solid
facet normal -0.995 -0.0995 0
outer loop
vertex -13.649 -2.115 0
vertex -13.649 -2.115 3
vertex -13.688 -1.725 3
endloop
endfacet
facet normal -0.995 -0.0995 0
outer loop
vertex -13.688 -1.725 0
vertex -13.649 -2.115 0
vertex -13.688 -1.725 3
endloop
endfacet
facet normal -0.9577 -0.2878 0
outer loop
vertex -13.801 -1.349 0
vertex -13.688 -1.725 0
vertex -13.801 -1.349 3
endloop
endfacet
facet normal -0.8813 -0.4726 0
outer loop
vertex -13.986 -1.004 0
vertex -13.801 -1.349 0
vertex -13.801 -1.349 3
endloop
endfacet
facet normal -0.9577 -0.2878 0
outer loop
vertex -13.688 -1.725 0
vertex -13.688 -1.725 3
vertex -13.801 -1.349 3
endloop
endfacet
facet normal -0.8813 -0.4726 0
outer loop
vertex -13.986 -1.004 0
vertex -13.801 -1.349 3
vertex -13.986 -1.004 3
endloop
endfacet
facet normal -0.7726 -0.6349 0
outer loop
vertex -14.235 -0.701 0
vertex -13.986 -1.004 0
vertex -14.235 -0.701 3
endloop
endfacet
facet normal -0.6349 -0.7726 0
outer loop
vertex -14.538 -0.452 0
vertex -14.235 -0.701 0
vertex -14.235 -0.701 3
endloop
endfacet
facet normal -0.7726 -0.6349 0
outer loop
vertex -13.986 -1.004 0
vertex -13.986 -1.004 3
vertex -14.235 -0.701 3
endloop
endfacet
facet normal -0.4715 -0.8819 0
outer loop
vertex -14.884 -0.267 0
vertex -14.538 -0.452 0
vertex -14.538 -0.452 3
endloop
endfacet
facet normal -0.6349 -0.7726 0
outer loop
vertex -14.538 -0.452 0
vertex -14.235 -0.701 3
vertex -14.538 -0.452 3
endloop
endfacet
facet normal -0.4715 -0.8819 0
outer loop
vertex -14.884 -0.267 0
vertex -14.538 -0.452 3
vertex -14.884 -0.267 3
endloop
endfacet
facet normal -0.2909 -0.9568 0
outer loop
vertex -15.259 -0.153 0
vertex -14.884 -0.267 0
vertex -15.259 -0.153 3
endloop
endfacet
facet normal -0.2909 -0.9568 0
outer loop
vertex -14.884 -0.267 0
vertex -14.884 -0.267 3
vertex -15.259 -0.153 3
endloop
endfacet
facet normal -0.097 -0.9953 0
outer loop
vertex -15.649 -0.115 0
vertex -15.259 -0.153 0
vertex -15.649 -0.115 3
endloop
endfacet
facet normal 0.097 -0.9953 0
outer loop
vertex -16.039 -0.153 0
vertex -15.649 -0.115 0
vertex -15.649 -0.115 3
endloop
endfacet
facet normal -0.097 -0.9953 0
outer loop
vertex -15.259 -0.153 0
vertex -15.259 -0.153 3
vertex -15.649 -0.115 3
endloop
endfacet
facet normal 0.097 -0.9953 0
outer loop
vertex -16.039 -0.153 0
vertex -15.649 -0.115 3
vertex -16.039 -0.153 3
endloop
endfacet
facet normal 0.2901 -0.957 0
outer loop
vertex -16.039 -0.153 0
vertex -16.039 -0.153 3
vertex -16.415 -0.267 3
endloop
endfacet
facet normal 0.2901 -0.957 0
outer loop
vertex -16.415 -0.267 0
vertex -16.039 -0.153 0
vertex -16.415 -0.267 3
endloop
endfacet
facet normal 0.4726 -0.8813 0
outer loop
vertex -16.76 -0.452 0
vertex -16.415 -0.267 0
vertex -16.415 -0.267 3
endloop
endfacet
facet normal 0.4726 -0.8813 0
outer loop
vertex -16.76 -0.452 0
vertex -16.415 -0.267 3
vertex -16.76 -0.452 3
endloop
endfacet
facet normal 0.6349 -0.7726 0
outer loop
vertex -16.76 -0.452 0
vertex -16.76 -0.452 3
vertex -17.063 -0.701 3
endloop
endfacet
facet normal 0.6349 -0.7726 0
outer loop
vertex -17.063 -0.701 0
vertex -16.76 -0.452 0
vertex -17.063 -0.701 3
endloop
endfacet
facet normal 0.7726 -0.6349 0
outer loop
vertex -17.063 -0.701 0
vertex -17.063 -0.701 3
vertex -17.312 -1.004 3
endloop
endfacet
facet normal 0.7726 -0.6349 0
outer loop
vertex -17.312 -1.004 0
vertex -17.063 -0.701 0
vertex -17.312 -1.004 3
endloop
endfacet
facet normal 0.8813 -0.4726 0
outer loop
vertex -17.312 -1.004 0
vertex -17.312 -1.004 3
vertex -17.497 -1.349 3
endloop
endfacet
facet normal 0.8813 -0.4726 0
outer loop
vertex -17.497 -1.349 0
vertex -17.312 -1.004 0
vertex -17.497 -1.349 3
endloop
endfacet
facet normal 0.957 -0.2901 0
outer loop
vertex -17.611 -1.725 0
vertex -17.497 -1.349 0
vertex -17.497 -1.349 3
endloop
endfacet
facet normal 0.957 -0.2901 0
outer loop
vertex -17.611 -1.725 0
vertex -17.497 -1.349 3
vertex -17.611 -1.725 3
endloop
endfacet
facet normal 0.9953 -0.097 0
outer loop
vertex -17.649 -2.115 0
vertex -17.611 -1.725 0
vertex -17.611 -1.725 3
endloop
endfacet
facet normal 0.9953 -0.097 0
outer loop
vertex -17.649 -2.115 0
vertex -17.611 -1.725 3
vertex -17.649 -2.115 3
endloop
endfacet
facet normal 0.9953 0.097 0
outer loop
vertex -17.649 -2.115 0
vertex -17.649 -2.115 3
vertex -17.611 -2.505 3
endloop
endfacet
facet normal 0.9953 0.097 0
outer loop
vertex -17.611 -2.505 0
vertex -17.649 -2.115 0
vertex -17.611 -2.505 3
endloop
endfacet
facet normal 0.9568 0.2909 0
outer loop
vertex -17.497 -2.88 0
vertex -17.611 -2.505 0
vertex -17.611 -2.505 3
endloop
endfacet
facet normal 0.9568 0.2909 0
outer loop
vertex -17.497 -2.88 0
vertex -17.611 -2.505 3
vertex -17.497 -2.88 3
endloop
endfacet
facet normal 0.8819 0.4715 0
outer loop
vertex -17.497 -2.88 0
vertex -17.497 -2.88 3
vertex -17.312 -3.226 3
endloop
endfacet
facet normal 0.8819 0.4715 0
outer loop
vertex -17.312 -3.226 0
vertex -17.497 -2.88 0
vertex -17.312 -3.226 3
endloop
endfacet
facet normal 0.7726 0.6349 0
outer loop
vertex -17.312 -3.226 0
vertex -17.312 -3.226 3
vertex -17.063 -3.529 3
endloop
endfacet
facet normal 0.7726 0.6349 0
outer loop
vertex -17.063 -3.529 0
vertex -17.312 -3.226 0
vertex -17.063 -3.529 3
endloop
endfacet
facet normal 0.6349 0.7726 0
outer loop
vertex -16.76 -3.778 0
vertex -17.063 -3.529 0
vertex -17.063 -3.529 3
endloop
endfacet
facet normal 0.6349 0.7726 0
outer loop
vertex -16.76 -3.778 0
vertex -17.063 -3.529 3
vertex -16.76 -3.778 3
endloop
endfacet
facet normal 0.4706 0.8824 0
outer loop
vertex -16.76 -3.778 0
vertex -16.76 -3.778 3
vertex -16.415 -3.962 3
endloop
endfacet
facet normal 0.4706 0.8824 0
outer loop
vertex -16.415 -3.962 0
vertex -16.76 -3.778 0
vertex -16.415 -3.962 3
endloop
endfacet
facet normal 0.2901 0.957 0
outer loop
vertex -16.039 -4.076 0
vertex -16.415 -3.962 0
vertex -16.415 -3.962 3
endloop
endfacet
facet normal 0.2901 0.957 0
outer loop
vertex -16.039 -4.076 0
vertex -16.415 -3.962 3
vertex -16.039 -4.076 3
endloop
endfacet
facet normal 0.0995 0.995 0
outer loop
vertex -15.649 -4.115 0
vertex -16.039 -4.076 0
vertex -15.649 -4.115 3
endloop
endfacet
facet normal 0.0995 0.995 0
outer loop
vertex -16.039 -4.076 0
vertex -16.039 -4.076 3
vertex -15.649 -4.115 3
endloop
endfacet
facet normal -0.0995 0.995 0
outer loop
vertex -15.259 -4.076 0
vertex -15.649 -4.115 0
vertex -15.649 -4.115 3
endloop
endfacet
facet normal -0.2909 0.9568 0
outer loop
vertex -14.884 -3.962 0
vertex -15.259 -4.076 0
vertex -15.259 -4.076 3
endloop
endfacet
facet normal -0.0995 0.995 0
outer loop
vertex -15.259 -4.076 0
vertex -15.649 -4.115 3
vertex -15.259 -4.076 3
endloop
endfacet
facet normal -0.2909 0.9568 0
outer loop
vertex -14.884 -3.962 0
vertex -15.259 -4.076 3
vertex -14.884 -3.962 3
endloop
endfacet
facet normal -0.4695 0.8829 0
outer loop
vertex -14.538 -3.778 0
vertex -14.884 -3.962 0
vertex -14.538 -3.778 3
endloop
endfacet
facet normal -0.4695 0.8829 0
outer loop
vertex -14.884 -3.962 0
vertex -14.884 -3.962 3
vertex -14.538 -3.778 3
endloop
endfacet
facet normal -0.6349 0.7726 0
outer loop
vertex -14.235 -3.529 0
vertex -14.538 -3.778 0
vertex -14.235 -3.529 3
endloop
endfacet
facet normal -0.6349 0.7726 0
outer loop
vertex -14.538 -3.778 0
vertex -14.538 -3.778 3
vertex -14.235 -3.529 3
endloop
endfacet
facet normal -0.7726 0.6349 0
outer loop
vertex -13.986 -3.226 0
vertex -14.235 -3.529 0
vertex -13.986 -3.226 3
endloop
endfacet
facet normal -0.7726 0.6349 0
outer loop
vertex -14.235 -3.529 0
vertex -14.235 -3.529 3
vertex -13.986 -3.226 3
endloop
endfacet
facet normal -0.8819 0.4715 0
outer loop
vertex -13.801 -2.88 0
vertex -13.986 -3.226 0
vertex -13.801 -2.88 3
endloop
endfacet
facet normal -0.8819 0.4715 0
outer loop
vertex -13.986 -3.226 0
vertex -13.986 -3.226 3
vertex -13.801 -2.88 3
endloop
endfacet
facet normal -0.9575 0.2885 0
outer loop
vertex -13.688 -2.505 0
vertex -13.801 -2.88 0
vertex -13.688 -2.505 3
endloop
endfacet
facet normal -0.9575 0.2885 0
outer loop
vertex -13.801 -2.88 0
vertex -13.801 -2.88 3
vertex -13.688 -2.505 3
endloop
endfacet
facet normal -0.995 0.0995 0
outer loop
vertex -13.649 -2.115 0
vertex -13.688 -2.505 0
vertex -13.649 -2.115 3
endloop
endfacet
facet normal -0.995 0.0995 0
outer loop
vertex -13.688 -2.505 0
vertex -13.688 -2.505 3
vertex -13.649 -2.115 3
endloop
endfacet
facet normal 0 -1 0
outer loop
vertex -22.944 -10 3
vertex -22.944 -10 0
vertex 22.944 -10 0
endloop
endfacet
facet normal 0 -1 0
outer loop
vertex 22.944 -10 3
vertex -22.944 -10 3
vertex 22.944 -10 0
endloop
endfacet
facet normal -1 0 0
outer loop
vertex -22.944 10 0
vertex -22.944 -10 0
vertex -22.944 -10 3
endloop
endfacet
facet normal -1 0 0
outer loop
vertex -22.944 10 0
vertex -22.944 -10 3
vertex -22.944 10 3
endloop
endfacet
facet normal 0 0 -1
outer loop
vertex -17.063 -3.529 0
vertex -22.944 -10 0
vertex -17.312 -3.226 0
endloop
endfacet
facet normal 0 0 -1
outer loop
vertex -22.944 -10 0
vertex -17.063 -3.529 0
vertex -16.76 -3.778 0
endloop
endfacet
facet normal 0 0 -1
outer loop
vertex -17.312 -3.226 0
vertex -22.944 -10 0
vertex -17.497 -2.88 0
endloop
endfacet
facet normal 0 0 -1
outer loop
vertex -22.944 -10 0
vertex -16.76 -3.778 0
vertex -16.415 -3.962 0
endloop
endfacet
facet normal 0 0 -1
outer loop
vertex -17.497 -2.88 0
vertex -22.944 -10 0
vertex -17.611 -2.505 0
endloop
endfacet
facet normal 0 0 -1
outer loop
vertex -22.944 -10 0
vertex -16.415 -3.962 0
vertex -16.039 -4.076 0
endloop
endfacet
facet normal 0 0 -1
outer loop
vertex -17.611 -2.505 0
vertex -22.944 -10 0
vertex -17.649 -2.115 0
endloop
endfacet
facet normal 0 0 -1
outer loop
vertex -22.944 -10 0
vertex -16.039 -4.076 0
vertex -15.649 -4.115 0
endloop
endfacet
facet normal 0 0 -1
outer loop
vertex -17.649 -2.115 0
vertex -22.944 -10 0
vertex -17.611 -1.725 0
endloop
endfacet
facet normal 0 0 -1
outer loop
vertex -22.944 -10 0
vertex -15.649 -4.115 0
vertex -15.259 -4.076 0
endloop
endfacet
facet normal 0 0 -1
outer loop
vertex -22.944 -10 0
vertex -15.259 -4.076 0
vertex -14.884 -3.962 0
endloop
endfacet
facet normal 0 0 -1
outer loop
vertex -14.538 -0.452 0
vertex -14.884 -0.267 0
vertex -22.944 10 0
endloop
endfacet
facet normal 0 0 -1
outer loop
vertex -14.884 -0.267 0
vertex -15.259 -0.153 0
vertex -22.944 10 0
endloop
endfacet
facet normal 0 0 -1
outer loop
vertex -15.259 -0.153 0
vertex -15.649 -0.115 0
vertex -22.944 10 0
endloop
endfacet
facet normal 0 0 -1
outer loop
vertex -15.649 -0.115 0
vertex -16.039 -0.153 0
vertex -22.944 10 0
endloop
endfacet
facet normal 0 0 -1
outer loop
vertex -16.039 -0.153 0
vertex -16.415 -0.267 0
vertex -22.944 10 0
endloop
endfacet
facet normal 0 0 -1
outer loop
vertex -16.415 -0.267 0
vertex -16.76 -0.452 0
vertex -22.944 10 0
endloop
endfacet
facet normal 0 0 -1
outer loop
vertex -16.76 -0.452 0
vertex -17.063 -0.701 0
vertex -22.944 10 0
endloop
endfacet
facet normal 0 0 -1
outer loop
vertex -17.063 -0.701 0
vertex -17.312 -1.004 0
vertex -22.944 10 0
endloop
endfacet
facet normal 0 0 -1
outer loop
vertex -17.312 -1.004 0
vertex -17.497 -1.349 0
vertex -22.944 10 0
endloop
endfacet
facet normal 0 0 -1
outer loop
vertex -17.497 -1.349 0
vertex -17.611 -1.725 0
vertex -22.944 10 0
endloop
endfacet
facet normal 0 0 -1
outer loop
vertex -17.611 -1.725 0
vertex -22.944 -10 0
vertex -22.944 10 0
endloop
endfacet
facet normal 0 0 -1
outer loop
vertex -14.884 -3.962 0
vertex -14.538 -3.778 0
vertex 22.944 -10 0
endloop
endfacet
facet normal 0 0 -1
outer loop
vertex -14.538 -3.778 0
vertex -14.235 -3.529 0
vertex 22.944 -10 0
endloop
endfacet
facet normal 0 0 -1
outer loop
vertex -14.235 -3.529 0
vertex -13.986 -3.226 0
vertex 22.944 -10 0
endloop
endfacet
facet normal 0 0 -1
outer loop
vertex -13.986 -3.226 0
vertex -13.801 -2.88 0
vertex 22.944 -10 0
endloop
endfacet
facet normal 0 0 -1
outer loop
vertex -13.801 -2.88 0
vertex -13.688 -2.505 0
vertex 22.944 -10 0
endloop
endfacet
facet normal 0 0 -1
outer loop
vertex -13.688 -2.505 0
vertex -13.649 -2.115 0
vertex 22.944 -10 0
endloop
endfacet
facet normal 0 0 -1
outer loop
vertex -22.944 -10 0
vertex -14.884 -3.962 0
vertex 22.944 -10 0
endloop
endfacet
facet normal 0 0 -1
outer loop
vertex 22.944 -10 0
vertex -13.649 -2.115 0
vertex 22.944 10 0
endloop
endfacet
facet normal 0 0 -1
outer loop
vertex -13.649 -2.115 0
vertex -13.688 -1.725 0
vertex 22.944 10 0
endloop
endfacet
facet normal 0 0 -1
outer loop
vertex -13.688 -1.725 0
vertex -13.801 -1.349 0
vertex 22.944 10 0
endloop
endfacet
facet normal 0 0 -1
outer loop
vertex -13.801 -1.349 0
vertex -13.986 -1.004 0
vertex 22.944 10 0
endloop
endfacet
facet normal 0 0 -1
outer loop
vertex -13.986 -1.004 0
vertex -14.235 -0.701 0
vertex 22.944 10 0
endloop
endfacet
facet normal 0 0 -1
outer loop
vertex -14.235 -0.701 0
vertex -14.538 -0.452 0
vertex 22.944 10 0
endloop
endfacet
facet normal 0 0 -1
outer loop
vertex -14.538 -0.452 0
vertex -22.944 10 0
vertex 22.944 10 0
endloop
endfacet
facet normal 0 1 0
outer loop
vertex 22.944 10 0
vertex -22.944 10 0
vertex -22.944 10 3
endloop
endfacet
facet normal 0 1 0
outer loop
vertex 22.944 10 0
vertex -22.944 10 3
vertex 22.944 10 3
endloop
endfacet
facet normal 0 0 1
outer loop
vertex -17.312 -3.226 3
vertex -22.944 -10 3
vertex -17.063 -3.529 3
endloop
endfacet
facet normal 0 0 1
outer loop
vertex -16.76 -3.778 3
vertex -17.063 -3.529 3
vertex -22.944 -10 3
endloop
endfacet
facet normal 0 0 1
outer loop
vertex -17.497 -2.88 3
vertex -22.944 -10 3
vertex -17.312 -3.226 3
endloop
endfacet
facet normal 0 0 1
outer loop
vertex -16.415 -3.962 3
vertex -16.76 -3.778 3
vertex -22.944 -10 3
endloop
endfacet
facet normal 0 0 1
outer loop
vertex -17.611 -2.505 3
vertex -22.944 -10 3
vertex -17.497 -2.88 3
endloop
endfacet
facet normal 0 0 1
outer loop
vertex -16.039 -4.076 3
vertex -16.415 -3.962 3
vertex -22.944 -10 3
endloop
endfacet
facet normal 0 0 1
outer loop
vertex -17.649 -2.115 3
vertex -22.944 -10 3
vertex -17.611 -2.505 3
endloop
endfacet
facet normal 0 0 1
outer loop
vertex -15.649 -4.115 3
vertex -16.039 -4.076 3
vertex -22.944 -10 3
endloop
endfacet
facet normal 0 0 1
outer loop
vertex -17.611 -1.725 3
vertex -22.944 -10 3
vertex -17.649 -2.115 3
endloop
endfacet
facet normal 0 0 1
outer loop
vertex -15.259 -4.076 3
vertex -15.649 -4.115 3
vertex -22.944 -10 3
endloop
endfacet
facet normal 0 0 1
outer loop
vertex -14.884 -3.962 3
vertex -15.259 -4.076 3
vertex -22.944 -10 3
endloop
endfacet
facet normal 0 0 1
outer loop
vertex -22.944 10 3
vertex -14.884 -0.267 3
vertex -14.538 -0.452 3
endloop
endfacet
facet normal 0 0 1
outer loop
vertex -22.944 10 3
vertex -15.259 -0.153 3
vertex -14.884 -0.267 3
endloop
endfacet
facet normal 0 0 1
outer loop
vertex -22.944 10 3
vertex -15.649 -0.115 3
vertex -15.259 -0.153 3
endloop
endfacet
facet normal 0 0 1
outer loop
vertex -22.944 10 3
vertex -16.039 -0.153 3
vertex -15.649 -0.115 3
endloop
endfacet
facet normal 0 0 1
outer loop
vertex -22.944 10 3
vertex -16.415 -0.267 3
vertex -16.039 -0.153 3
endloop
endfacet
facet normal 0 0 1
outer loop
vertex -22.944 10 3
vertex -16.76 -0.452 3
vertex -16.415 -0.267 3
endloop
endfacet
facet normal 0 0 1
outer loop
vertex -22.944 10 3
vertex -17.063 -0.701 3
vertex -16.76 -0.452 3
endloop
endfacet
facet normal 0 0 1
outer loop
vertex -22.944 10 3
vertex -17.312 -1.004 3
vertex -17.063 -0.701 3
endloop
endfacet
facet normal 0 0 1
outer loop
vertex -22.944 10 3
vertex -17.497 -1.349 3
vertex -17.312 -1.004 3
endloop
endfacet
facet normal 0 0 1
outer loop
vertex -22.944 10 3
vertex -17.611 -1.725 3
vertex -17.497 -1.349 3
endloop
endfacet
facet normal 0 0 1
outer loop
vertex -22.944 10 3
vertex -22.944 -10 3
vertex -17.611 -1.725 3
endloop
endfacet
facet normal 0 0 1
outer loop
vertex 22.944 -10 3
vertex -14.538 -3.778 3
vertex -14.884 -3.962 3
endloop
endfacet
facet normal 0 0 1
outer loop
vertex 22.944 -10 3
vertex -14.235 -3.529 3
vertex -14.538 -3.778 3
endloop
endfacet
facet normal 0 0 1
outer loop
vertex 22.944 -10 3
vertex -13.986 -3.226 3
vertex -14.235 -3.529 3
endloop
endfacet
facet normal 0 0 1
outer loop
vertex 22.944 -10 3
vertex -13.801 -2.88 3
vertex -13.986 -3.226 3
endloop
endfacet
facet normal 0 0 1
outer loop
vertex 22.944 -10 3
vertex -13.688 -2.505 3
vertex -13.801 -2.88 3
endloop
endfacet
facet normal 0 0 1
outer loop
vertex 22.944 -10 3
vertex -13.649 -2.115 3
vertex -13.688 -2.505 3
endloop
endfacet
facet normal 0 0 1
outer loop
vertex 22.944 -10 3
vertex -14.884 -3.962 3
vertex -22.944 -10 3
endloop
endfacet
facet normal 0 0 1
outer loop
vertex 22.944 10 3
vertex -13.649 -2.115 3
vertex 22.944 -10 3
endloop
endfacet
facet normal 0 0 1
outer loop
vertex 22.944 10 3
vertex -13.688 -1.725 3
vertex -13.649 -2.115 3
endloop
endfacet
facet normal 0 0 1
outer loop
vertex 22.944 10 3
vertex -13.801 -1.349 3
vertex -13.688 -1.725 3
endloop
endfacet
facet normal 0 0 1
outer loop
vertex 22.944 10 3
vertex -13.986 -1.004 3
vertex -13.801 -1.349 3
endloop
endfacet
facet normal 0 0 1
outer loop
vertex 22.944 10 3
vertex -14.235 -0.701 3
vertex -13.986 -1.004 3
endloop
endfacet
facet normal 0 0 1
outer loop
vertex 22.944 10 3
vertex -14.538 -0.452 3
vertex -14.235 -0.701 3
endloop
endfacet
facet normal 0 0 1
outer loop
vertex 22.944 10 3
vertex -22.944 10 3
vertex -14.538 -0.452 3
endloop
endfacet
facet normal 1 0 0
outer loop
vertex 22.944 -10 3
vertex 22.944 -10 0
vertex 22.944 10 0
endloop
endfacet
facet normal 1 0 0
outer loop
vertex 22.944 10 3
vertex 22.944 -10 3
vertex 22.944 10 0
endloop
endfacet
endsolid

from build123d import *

# Parameters (mm, degrees)
F0_W          = 45.8885646038
F0_H          = 20
F1_DEPTH      = 3
F2_R          = 2
F3_DEPTH      = 52
F3_DEPTH_BACK = 25


# Not quite as in the source:
# - an extrude ends at something that could not be found from the text; its depth is read off the source's solid


with BuildPart() as f1:
    # F0 (on Top) → F1 (new body)
    with BuildSketch(Plane.XY):
        Rectangle(F0_W, F0_H)
    extrude(amount=F1_DEPTH)

    # F2 (on face) → F3 (cut, two sides)
    with BuildSketch(Plane.XY.offset(3)) as f3_sk:
        with Locations((-15.6491361558, -2.1147204097)):
            Circle(F2_R)
    extrude(amount=F3_DEPTH, mode=Mode.SUBTRACT)
    extrude(f3_sk.sketch, amount=-F3_DEPTH_BACK, mode=Mode.SUBTRACT)


solid = f1.part
